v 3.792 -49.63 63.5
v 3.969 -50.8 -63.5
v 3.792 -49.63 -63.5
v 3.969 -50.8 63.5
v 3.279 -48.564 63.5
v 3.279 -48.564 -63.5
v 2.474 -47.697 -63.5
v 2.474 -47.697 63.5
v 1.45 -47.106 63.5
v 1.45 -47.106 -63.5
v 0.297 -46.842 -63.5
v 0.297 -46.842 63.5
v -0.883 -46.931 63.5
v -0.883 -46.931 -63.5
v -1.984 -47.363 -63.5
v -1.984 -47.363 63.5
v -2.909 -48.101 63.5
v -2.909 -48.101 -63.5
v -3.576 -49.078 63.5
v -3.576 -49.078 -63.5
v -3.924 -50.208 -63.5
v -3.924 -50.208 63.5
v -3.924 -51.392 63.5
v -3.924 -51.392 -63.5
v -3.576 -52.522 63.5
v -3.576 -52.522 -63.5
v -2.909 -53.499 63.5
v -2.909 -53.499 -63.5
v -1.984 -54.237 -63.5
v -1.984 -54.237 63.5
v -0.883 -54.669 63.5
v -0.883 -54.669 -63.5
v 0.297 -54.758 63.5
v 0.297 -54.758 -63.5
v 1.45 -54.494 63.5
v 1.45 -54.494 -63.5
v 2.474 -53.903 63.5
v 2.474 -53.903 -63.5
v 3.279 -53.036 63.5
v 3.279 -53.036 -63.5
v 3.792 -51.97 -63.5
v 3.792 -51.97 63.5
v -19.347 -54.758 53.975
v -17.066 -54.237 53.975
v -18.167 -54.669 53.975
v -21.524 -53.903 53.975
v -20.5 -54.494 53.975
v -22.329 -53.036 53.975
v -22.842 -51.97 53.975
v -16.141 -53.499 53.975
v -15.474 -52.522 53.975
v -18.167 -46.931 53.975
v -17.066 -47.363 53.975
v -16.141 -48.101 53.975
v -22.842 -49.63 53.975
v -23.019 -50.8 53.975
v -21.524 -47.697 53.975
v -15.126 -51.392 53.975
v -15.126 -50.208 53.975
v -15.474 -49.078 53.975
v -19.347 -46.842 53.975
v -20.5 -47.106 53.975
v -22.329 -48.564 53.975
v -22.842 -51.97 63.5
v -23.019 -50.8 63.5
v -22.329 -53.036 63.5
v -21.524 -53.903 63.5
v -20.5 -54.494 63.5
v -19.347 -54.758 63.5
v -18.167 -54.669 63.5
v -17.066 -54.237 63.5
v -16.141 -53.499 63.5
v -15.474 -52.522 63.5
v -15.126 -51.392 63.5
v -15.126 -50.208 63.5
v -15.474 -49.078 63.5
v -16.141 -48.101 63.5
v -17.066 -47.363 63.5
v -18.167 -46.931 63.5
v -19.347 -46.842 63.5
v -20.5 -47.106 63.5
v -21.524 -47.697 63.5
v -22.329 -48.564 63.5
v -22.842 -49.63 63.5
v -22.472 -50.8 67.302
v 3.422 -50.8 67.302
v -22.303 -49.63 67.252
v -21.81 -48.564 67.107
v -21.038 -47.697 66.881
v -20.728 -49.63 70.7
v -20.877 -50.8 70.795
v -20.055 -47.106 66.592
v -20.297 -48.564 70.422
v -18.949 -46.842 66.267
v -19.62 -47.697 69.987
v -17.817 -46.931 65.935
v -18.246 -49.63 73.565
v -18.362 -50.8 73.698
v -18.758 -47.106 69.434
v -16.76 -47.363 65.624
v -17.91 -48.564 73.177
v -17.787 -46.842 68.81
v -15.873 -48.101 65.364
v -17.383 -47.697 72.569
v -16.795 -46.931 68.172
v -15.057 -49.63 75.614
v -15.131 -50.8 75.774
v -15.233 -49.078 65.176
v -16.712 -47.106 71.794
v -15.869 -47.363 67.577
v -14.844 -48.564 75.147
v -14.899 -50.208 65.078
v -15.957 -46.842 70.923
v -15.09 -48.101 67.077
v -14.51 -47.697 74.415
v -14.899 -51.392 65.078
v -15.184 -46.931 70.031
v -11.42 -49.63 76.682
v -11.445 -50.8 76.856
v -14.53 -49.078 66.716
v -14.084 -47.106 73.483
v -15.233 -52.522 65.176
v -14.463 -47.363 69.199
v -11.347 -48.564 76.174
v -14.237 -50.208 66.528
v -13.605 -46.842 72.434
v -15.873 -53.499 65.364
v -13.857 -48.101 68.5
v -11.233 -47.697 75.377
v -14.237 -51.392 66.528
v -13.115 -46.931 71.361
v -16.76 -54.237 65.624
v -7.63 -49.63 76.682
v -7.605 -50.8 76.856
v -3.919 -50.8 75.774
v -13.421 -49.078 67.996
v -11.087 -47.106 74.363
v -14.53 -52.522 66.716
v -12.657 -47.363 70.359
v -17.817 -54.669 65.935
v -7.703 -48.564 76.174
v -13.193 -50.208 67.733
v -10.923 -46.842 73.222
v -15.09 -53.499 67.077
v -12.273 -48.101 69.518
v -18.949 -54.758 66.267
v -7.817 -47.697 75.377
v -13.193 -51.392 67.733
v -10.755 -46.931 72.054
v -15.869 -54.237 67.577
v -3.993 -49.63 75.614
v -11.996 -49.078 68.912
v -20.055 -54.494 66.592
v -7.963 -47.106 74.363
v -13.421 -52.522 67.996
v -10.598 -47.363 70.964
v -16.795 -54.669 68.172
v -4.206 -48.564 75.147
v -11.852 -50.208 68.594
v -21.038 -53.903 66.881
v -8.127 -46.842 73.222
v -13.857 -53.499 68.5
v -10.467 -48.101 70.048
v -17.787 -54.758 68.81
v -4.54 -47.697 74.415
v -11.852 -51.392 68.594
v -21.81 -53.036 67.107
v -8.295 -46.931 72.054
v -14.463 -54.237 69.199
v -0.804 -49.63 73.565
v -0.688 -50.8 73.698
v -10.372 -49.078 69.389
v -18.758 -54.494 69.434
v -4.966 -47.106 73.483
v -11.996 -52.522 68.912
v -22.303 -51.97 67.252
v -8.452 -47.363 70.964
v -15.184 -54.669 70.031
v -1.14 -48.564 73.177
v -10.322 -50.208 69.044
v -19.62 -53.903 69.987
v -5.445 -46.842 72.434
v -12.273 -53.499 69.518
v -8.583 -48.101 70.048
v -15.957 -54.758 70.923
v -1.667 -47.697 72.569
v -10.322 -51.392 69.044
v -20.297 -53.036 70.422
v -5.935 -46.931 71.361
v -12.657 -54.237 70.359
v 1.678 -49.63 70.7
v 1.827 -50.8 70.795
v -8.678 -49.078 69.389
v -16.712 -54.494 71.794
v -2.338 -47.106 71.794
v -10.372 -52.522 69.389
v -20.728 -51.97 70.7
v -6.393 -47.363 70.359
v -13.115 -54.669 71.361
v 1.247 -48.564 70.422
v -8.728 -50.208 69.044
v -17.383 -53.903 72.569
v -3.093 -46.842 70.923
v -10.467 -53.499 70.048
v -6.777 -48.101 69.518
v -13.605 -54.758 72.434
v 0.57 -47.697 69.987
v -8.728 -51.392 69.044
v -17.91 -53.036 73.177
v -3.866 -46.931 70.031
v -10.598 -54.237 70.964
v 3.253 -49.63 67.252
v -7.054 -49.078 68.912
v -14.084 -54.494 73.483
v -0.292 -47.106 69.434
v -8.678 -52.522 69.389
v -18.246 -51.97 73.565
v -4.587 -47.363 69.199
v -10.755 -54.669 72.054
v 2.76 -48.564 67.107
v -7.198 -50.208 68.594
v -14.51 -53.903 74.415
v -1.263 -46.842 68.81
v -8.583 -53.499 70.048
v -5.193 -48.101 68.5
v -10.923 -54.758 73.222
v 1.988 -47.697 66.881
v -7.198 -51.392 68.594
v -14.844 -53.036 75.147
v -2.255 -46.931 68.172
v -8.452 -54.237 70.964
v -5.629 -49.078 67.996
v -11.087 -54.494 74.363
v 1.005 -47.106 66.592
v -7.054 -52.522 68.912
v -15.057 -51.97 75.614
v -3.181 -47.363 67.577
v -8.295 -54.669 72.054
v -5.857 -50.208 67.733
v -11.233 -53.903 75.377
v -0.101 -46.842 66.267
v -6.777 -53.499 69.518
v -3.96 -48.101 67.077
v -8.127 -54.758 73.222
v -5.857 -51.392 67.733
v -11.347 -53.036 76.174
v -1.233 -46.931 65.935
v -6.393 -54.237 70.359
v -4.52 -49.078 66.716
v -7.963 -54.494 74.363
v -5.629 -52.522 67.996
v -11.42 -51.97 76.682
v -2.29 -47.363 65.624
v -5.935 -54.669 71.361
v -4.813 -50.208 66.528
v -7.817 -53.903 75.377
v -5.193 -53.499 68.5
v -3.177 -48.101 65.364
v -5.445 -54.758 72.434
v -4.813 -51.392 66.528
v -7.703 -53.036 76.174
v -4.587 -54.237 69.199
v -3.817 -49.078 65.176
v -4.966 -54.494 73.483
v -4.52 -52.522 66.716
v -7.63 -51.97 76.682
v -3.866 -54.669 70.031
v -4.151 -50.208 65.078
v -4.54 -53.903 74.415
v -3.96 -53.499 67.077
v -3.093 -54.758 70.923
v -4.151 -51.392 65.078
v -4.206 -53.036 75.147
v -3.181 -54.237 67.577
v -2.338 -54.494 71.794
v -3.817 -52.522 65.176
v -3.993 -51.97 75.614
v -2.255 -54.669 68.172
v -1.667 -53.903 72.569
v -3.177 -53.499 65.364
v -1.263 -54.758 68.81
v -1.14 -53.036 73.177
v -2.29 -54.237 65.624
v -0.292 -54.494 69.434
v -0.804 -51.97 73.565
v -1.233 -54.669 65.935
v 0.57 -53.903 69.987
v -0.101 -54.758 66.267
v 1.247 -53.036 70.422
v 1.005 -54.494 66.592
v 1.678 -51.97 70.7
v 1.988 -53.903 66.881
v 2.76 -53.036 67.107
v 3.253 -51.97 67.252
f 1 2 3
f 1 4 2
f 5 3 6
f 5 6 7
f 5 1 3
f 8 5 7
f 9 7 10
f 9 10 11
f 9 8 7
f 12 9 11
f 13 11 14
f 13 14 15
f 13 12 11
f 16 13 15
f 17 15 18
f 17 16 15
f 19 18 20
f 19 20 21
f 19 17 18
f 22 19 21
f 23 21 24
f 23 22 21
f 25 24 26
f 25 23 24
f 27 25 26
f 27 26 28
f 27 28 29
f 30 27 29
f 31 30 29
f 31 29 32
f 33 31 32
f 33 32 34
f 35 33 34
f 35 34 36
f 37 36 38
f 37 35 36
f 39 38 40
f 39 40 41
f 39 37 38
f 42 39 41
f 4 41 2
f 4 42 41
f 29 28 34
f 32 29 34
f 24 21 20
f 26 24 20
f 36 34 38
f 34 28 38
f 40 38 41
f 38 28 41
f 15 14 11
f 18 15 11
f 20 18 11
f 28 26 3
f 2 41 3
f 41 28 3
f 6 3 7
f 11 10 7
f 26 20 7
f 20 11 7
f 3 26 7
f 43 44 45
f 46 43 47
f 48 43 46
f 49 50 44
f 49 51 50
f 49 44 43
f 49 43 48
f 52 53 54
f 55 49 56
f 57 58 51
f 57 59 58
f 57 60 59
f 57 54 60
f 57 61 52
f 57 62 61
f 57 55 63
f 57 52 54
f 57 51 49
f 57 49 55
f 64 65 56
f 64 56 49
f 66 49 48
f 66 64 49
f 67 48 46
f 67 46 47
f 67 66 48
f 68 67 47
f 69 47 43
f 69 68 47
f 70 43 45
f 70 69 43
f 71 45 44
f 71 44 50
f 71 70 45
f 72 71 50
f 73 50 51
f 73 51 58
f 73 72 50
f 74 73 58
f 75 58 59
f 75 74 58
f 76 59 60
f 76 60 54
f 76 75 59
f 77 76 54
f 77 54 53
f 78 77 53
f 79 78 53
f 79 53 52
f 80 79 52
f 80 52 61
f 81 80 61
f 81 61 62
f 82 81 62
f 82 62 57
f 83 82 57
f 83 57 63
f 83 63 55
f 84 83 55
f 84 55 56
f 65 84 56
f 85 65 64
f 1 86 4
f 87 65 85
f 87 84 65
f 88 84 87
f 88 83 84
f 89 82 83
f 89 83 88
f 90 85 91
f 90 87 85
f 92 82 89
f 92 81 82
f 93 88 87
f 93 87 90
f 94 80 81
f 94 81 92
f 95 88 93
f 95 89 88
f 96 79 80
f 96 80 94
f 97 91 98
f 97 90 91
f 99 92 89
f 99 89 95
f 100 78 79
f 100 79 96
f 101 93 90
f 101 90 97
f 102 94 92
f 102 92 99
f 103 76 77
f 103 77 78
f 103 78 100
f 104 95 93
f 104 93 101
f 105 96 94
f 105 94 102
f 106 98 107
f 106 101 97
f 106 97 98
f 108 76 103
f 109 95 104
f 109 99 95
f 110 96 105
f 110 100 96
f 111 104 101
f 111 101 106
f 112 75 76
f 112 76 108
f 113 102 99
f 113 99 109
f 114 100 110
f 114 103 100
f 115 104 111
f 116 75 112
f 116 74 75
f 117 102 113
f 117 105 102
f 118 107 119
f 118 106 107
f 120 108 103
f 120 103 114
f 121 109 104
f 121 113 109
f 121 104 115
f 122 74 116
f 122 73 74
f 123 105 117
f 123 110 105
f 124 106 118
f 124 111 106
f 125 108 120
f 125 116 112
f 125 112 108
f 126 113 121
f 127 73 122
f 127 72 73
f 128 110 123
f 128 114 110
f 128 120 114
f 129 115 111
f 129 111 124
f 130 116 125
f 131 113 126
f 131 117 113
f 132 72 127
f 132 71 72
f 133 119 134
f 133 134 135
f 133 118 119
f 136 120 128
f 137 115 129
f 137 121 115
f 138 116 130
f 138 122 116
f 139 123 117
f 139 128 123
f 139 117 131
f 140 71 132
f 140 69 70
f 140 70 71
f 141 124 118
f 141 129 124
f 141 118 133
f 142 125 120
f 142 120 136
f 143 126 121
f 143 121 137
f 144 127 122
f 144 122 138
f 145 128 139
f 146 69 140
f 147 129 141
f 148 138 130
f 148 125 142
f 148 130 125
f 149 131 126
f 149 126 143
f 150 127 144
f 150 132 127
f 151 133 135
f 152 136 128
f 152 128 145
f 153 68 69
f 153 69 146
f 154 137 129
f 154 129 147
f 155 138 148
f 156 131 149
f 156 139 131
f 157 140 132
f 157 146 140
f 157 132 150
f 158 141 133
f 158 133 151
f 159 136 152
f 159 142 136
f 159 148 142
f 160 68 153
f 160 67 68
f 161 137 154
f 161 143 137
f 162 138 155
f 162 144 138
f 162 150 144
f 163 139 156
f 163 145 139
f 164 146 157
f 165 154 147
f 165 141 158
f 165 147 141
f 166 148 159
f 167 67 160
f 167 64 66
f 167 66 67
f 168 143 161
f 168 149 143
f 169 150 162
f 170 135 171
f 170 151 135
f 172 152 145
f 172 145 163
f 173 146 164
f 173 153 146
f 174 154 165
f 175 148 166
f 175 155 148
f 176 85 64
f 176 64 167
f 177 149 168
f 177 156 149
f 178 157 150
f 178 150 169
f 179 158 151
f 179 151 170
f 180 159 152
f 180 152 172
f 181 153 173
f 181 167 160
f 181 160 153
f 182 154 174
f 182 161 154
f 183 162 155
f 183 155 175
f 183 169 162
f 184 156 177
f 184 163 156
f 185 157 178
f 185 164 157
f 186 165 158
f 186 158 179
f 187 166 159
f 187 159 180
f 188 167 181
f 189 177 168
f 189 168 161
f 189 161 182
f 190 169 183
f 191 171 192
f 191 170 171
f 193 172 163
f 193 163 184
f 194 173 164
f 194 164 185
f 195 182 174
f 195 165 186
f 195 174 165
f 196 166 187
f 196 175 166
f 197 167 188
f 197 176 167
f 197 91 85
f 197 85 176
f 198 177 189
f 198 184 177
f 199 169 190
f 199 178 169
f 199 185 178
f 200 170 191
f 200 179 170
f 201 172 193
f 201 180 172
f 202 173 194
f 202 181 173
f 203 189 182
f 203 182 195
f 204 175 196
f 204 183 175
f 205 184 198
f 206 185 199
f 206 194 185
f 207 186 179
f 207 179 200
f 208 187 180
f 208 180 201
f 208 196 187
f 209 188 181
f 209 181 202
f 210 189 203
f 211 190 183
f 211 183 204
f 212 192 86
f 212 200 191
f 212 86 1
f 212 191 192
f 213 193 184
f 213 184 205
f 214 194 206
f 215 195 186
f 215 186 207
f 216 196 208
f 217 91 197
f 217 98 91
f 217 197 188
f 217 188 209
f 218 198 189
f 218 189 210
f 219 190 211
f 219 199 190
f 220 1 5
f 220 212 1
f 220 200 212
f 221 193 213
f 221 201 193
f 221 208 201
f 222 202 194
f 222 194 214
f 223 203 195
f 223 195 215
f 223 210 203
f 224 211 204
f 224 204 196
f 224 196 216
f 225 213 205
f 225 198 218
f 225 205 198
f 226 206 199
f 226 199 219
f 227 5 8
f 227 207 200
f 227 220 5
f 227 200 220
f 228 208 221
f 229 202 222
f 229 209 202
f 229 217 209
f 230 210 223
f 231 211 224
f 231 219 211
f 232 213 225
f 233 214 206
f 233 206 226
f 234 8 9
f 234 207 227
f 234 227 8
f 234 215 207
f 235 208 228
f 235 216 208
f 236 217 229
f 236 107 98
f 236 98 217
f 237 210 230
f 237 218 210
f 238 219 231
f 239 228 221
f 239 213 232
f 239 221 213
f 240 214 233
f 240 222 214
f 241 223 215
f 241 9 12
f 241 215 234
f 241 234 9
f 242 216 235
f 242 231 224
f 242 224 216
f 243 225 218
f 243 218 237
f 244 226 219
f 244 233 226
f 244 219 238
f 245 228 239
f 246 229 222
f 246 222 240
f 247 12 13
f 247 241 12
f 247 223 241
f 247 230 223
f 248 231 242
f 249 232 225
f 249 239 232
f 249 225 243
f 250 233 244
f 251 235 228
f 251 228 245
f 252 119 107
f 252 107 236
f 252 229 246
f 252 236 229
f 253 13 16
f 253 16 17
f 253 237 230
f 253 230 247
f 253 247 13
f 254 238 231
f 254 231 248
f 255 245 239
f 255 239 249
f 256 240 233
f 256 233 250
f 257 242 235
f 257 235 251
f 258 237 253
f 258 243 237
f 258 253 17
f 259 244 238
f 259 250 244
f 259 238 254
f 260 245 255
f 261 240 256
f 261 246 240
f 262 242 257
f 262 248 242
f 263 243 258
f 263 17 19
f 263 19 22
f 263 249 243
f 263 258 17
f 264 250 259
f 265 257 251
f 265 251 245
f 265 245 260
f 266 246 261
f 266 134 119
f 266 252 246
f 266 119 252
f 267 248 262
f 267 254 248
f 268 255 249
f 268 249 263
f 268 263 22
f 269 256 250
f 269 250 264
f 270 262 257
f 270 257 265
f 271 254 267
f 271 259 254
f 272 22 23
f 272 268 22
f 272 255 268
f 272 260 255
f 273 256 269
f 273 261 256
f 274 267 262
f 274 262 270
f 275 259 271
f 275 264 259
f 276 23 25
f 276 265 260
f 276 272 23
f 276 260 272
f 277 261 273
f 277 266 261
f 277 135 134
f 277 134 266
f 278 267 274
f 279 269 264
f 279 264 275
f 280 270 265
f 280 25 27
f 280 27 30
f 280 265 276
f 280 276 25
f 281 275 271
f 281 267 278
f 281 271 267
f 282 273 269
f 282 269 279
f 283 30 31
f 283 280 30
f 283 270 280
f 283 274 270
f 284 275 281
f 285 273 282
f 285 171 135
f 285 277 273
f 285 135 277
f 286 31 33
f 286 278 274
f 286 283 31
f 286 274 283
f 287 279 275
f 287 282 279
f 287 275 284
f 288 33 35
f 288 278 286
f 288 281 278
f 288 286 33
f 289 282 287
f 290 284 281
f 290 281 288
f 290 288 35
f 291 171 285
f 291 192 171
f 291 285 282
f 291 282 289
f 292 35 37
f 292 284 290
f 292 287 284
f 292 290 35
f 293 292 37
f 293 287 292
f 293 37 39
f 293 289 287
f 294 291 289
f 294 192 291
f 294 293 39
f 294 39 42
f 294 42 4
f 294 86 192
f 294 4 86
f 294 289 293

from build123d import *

# Parameters (mm, degrees)
SKETCH2_R           = 3.96875
BOSS_EXTRUDE1_DEPTH = 63.5
SKETCH3_R           = 3.96875


with BuildPart() as part:
    # Sketch2 → Boss-Extrude1 (new, symmetric)
    with BuildSketch(Plane.XY):
        with Locations((0, -50.8)):
            Circle(SKETCH2_R)
    extrude(amount=BOSS_EXTRUDE1_DEPTH, both=True)

    # Sweep1: sweep along a path in Sketch4
    with BuildLine(Plane(origin=(0, 0, 0), x_dir=(1, 0, 0), z_dir=(0, 1, 0))) as sweep1_path:
        Line((-19.05, -53.975), (-19.05, -63.5))
        ThreePointArc((-19.05, -63.5), (-9.525, -73.025), (0, -63.5))
    # Sketch3 → Sweep1 (sweep)
    with BuildSketch(Plane.XY.offset(63.5)):
        with Locations((0, -50.8)):
            Circle(SKETCH3_R)
    sweep(path=sweep1_path.line)


solid = part.part
